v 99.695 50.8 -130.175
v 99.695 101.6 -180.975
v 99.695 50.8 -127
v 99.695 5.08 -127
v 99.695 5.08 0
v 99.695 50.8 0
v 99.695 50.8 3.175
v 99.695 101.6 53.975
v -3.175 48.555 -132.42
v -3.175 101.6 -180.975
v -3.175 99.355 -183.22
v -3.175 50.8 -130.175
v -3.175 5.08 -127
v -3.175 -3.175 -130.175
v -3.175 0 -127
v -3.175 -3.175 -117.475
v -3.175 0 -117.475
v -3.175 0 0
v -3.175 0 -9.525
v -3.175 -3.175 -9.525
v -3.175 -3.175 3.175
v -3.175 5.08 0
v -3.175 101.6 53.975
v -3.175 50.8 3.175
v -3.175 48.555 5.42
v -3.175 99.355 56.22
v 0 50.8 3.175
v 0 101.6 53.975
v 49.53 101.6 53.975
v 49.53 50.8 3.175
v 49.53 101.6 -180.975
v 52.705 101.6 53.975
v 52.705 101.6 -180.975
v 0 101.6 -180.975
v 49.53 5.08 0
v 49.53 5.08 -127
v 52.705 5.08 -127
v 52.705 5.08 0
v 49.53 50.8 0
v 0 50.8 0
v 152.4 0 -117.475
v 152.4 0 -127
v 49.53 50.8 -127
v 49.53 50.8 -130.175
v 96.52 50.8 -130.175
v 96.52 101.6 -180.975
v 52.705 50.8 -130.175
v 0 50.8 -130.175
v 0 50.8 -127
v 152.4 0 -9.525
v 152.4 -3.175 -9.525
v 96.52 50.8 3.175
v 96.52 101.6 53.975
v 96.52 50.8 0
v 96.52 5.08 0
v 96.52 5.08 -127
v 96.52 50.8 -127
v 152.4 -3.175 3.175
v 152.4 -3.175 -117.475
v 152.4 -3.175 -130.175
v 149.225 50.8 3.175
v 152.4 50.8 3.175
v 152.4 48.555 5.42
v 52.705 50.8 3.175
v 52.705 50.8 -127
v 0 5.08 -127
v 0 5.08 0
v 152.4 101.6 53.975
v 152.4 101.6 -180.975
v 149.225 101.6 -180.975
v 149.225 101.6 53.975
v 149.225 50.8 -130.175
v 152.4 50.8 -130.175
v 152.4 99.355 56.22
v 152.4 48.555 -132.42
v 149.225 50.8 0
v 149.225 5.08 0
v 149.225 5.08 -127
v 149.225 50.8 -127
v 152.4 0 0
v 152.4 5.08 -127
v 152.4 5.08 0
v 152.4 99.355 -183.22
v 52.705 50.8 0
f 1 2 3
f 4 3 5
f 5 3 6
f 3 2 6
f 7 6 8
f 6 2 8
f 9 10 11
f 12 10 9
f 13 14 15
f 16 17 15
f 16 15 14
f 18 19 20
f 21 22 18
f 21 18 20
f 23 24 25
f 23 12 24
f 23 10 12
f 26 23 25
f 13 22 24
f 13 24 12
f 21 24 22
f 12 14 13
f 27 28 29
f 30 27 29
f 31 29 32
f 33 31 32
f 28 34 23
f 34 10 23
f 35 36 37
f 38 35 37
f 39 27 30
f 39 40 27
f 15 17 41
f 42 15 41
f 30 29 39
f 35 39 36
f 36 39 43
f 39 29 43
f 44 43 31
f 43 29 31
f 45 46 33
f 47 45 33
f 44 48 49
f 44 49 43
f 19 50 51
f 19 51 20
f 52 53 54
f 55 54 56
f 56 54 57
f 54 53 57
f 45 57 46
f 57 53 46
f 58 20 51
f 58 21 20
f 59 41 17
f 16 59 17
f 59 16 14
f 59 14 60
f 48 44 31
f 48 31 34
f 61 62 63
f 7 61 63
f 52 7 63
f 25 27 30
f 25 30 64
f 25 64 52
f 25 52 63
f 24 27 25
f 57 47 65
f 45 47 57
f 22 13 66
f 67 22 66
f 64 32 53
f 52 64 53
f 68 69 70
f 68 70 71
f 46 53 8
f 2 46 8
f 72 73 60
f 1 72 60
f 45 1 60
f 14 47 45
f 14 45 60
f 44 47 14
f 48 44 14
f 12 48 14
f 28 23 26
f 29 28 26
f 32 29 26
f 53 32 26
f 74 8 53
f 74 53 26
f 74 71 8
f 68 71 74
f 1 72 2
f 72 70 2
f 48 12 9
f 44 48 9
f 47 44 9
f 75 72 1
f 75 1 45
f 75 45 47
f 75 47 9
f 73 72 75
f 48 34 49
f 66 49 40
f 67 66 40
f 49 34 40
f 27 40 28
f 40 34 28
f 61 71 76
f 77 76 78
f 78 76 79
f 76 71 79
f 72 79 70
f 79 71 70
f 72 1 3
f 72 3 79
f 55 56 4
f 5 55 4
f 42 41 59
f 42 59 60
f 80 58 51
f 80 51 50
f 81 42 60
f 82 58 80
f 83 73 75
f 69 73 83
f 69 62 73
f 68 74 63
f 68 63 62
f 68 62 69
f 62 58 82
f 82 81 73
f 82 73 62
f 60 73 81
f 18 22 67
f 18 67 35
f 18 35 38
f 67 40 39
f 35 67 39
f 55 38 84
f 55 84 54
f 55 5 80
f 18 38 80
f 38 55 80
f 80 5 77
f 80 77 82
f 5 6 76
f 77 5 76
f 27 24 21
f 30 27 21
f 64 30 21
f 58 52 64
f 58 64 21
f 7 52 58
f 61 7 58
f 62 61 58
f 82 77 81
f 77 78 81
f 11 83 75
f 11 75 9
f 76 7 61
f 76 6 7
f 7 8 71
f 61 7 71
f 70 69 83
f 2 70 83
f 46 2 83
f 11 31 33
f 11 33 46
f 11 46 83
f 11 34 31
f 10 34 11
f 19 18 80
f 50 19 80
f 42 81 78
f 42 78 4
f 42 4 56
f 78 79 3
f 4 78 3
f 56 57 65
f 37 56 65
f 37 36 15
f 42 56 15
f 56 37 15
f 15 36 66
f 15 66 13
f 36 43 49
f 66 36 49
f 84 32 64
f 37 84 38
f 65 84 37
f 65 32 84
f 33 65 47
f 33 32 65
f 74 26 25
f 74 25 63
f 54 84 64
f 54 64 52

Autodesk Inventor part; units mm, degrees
ref_plane "YZ Plane" through (0, 0, 0) normal (1, 0, 0) x (0, 1, 0)
ref_plane "XZ Plane" through (0, 0, 0) normal (0, 1, 0) x (-1, 0, 0)
ref_plane "XY Plane" through (0, 0, 0) normal (0, 0, 1) x (1, 0, 0)
sketch "Sketch1" plane through (0, 0, 0) normal (0, 1, 0) x (-1, 0, 0)
  line L0 (0, 0) -> (-152.4, 0)
  line L1 (-152.4, 0) -> (-152.4, -127)
  line L2 (-152.4, -127) -> (0, -127)
  line L3 (0, -127) -> (0, 0)
  line L4 (0, 0) -> (-152.4, 0)
  line L5 (-152.4, 0) -> (-152.4, 3.175)
  line L6 (-152.4, 3.175) -> (0, 3.175)
  line L7 (0, 3.175) -> (0, 0)
  line L8 (0, -127) -> (-152.4, -127)
  line L9 (-152.4, -127) -> (-152.4, -130.175)
  line L10 (-152.4, -130.175) -> (0, -130.175)
  line L11 (0, -130.175) -> (0, -127)
  dimension "d0" = 152.4
  dimension "d1" = 127
  dimension "d2" = 152.4
  dimension "d3" = 3.175
  dimension "d4" = 152.4
  dimension "d5" = 3.175
extrude "Extrusion1" add sketch "Sketch1" along normal blind 50.8 contours L0 L5 L6 L7 | L11 L10 L9 L2
sketch "Sketch2" plane through (0, 50.8, 0) normal (0, 1, 0) x (1, 0, 0)
  line L0 (0, -3.175) -> (152.4, -3.175) projected
  line L1 (0, -3.175) -> (-3.175, -3.175)
  line L2 (-3.175, -3.175) -> (-3.175, 130.175)
  line L3 (-3.175, 130.175) -> (0, 130.175)
  line L4 (0, 130.175) -> (0, -3.175)
  point P0 (0, 0)
  dimension "d8" = 3.175
  dimension "d9" = 133.35
extrude "Extrusion2" add sketch "Sketch2" against normal blind 45.72
sketch "Sketch3" plane through (0, 0, 3.175) normal (0, 0, 1) x (1, 0, 0)
  line L0 (-3.175, 5.08) -> (0, 5.08) projected
  line L1 (-3.175, 5.08) -> (0, 5.08)
  line L2 (0, 5.08) -> (0, 0)
  line L3 (0, 0) -> (-3.175, 0)
  line L4 (-3.175, 0) -> (-3.175, 5.08)
extrude "Extrusion3" add sketch "Sketch3" against normal blind 3.175
sketch "Sketch4" plane through (152.4, 0, -130.175) normal (0, 0, -1) x (-1, 0, 0)
  line L0 (152.4, 0) -> (155.575, 0)
  line L1 (155.575, 0) -> (155.575, 5.08)
  line L2 (155.575, 5.08) -> (152.4, 5.08)
  line L3 (152.4, 5.08) -> (152.4, 0)
extrude "Extrusion4" add sketch "Sketch4" against normal blind 3.175
sketch "Sketch5" plane through (0, 50.8, 0) normal (0, 1, 0) x (1, 0, 0)
  line L0 (152.4, -3.175) -> (152.4, 0) projected
  line L1 (0, 127) -> (152.4, 127) projected
  line L2 (152.4, 0) -> (149.225, 0)
  line L3 (149.225, 0) -> (149.225, 127)
  line L4 (149.225, 127) -> (152.4, 127)
  line L5 (152.4, 127) -> (152.4, 0)
  point P0 (0, 0)
  dimension "d16" = 3.175
extrude "Extrusion5" add sketch "Sketch5" against normal blind 45.72
sketch "Sketch7" plane through (0, 0, 0) normal (0, -1, 0) x (1, 0, 0)
  line L0 (-3.175, 3.175) -> (-3.175, 0) projected
  line L1 (152.4, -127) -> (152.4, 0) projected
  line L2 (-3.175, 3.175) -> (152.4, 3.175)
  line L3 (152.4, 3.175) -> (152.4, -9.525)
  line L4 (152.4, -9.525) -> (-3.175, -9.525)
  line L5 (-3.175, -9.525) -> (-3.175, 3.175)
  line L6 (-3.175, -130.175) -> (-3.175, 3.175) projected
  line L7 (-3.175, -130.175) -> (152.4, -130.175)
  line L8 (152.4, -130.175) -> (152.4, -117.475)
  line L9 (152.4, -117.475) -> (-3.175, -117.475)
  line L10 (-3.175, -117.475) -> (-3.175, -130.175)
  point P0 (0, 0)
  point P1 (-3.175, -117.475)
  dimension "d19" = 12.7
  dimension "d20" = 155.575
  dimension "d21" = 12.7
extrude "Extrusion6" add sketch "Sketch7" along normal blind 3.175 contours L2 L3 L1 L4 L5 L0 | L9 L1 L8 L7 L6
sketch "Sketch8" plane through (0, 50.8, 0) normal (0, 1, 0) x (1, 0, 0)
  line L0 (0, 0) -> (49.53, 0) construction
  line L1 (49.53, 0) -> (49.53, 127) construction
  line L2 (49.53, 127) -> (0, 127) construction
  line L3 (0, 127) -> (0, 0) construction
  line L4 (149.225, 0) -> (152.4, 0) construction
  line L5 (149.225, 0) -> (99.695, 0) construction
  line L6 (99.695, 0) -> (99.695, 127) construction
  line L7 (99.695, 127) -> (149.225, 127) construction
  line L8 (149.225, 127) -> (149.225, 0) construction
  line L9 (99.695, 0) -> (96.52, 0)
  line L10 (96.52, 0) -> (96.52, 127)
  line L11 (96.52, 127) -> (99.695, 127)
  line L12 (99.695, 127) -> (99.695, 0)
  line L13 (49.53, 0) -> (52.705, 0)
  line L14 (52.705, 0) -> (52.705, 127)
  line L15 (52.705, 127) -> (49.53, 127)
  line L16 (49.53, 127) -> (49.53, 0)
  dimension "d24" = 49.53
  dimension "d25" = 127
  dimension "d26" = 49.53
  dimension "d27" = 127
  dimension "d28" = 3.175
  dimension "d29" = 127
  dimension "d30" = 3.175
  dimension "d31" = 127
extrude "Extrusion7" add sketch "Sketch8" against normal blind 45.72
sketch "Sketch9" plane through (152.4, 50.8, 3.175) normal (1, 0, 0) x (0, 0, -1)
  line L0 (0, 0) -> (133.35, 0)
  line L1 (133.35, 0) -> (133.35, 50.8)
  line L2 (133.35, 50.8) -> (0, 50.8)
  line L3 (0, 50.8) -> (0, 0)
  line L4 (133.35, 50.8) -> (184.15, 50.8)
  line L5 (184.15, 50.8) -> (133.35, 0)
  line L6 (0, 50.8) -> (-50.8, 50.8)
  line L7 (0, 50.8) -> (50.8, 50.8) construction
  line L8 (-50.8, 50.8) -> (0, 0)
  point P0 (3.175, -50.8)
  dimension "d34" = 133.35
  dimension "d35" = 50.8
  dimension "d36" = 50.8
  dimension "d37" = 50.8
  dimension "d38" = 180
extrude "Extrusion8" add sketch "Sketch9" against normal blind 3.175
sketch "Sketch10" plane through (-3.175, 50.8, -130.175) normal (-1, 0, 0) x (0, 0, 1)
  line L0 (3.175, 0) -> (0, 0) projected
  line L1 (0, 0) -> (133.35, 0)
  line L2 (133.35, 0) -> (133.35, 50.8)
  line L3 (133.35, 50.8) -> (0, 50.8)
  line L4 (0, 50.8) -> (0, 0)
  line L5 (-50.8, 50.8) -> (184.15, 50.8) projected
  line L6 (0, 50.8) -> (-50.8, 50.8)
  line L7 (-50.8, 50.8) -> (0, 0)
  line L8 (133.35, 50.8) -> (184.15, 50.8)
  line L9 (133.35, 0) -> (184.15, 50.8)
  point P0 (130.175, -50.8)
  dimension "d41" = 133.35
  dimension "d42" = 50.8
extrude "Extrusion9" add sketch "Sketch10" against normal blind 3.175
sketch "Sketch11" plane through (-3.175, 50.8, 3.175) normal (0, -0.7071, 0.7071) x (1, 0, 0)
  line L0 (0, 71.842) -> (0, -94.2927) projected
  line L1 (155.575, 0) -> (155.575, -38.1661) projected
  line L2 (0, 71.842) -> (155.575, 71.842)
  line L3 (155.575, 71.842) -> (155.575, 0)
  line L4 (155.575, 0) -> (0, 0)
  line L5 (0, 0) -> (0, 71.842)
  point P0 (3.175, -38.1661)
  point P1 (0, 0)
extrude "Extrusion10" add sketch "Sketch11" along normal blind 3.175
sketch "Sketch12" plane through (152.4, 50.8, -130.175) normal (0, -0.7071, -0.7071) x (-1, 0, 0)
  line L0 (0, 0) -> (0, 71.842) projected
  line L1 (152.4, 0) -> (155.575, 0) projected
  line L2 (0, 71.842) -> (155.575, 71.842)
  line L3 (155.575, 71.842) -> (155.575, 0)
  line L4 (155.575, 0) -> (0, 0)
  line L5 (0, 0) -> (0, 71.842)
  point P0 (152.4, -127.9686)
extrude "Extrusion11" add sketch "Sketch12" along normal blind 3.175
sketch "Sketch13" plane through (-3.175, 101.6, 53.975) normal (0, 1, 0) x (1, 0, 0)
  line L0 (52.705, 180.975) -> (52.705, 53.975) construction
  line L1 (52.705, 53.975) -> (52.705, 0) construction
  line L2 (152.4, 0) -> (3.175, 0) construction
  line L3 (55.88, 53.975) -> (55.88, 180.975) construction
  line L4 (55.88, 180.975) -> (55.88, 234.95) construction
  line L5 (3.175, 234.95) -> (152.4, 234.95) construction
  line L6 (52.705, 0) -> (55.88, 0)
  line L7 (55.88, 0) -> (55.88, 234.95)
  line L8 (55.88, 234.95) -> (52.705, 234.95)
  line L9 (52.705, 234.95) -> (52.705, 0)
  point P0 (3.175, 53.975)
extrude "Extrusion12" add sketch "Sketch13" against normal blind 3.175
sketch "Sketch14" plane through (52.705, 101.6, 53.975) normal (1, 0, 0) x (0, 0, -1)
  line L0 (3.175, -3.175) -> (50.8, -50.8)
  line L1 (50.8, -50.8) -> (50.8, -3.175)
  line L2 (231.775, -3.175) -> (3.175, -3.175) projected
  point P0 (53.975, -101.6)
extrude "Extrusion13" add sketch "Sketch14" against normal blind 3.175
sketch "Sketch15" plane through (52.705, 101.6, 53.975) normal (1, 0, 0) x (0, 0, -1)
  line L0 (50.8, -50.8) -> (50.8, -3.175) projected
  line L1 (50.8, -3.175) -> (184.15, -3.175)
  line L2 (184.15, -3.175) -> (184.15, -50.8)
  line L3 (184.15, -50.8) -> (50.8, -50.8)
  line L4 (50.8, -50.8) -> (50.8, -3.175)
  line L5 (184.15, -50.8) -> (231.775, -3.175)
  line L6 (231.775, -3.175) -> (184.15, -3.175)
  line L7 (231.775, -3.175) -> (50.8, -3.175) projected
  point P0 (53.975, -101.6)
extrude "Extrusion14" add sketch "Sketch15" against normal blind 3.175
sketch "Sketch16" plane through (-3.175, 101.6, 53.975) normal (0, 1, 0) x (1, 0, 0)
  line L0 (152.4, 53.975) -> (102.87, 53.975) construction
  line L1 (102.87, 53.975) -> (102.87, 0) construction
  line L2 (152.4, 0) -> (55.88, 0) construction
  line L3 (55.88, 180.975) -> (99.695, 180.975) construction
  line L4 (99.695, 180.975) -> (99.695, 234.95) construction
  line L5 (55.88, 234.95) -> (152.4, 234.95) construction
  line L6 (102.87, 0) -> (99.695, 0)
  line L7 (99.695, 0) -> (99.695, 234.95)
  line L8 (99.695, 234.95) -> (102.87, 234.95)
  line L9 (102.87, 234.95) -> (102.87, 0)
  point P0 (3.175, 53.975)
extrude "Extrusion15" add sketch "Sketch16" against normal blind 3.175
sketch "Sketch17" plane through (99.695, 101.6, 53.975) normal (1, 0, 0) x (0, 0, -1)
  line L0 (231.775, -3.175) -> (3.175, -3.175) projected
  line L1 (3.175, -3.175) -> (50.8, -50.8)
  line L2 (50.8, -50.8) -> (50.8, -3.175)
  line L3 (50.8, -3.175) -> (3.175, -3.175)
  line L4 (50.8, -3.175) -> (184.15, -3.175)
  line L5 (184.15, -3.175) -> (184.15, -50.8)
  line L6 (184.15, -50.8) -> (50.8, -50.8)
  line L7 (50.8, -50.8) -> (50.8, -3.175)
  line L8 (184.15, -3.175) -> (231.775, -3.175)
  line L9 (184.15, -50.8) -> (231.775, -3.175)
  point P0 (53.975, -101.6)
extrude "Extrusion16" add sketch "Sketch17" against normal blind 3.175
properties part number "BeadCompartments_2"
